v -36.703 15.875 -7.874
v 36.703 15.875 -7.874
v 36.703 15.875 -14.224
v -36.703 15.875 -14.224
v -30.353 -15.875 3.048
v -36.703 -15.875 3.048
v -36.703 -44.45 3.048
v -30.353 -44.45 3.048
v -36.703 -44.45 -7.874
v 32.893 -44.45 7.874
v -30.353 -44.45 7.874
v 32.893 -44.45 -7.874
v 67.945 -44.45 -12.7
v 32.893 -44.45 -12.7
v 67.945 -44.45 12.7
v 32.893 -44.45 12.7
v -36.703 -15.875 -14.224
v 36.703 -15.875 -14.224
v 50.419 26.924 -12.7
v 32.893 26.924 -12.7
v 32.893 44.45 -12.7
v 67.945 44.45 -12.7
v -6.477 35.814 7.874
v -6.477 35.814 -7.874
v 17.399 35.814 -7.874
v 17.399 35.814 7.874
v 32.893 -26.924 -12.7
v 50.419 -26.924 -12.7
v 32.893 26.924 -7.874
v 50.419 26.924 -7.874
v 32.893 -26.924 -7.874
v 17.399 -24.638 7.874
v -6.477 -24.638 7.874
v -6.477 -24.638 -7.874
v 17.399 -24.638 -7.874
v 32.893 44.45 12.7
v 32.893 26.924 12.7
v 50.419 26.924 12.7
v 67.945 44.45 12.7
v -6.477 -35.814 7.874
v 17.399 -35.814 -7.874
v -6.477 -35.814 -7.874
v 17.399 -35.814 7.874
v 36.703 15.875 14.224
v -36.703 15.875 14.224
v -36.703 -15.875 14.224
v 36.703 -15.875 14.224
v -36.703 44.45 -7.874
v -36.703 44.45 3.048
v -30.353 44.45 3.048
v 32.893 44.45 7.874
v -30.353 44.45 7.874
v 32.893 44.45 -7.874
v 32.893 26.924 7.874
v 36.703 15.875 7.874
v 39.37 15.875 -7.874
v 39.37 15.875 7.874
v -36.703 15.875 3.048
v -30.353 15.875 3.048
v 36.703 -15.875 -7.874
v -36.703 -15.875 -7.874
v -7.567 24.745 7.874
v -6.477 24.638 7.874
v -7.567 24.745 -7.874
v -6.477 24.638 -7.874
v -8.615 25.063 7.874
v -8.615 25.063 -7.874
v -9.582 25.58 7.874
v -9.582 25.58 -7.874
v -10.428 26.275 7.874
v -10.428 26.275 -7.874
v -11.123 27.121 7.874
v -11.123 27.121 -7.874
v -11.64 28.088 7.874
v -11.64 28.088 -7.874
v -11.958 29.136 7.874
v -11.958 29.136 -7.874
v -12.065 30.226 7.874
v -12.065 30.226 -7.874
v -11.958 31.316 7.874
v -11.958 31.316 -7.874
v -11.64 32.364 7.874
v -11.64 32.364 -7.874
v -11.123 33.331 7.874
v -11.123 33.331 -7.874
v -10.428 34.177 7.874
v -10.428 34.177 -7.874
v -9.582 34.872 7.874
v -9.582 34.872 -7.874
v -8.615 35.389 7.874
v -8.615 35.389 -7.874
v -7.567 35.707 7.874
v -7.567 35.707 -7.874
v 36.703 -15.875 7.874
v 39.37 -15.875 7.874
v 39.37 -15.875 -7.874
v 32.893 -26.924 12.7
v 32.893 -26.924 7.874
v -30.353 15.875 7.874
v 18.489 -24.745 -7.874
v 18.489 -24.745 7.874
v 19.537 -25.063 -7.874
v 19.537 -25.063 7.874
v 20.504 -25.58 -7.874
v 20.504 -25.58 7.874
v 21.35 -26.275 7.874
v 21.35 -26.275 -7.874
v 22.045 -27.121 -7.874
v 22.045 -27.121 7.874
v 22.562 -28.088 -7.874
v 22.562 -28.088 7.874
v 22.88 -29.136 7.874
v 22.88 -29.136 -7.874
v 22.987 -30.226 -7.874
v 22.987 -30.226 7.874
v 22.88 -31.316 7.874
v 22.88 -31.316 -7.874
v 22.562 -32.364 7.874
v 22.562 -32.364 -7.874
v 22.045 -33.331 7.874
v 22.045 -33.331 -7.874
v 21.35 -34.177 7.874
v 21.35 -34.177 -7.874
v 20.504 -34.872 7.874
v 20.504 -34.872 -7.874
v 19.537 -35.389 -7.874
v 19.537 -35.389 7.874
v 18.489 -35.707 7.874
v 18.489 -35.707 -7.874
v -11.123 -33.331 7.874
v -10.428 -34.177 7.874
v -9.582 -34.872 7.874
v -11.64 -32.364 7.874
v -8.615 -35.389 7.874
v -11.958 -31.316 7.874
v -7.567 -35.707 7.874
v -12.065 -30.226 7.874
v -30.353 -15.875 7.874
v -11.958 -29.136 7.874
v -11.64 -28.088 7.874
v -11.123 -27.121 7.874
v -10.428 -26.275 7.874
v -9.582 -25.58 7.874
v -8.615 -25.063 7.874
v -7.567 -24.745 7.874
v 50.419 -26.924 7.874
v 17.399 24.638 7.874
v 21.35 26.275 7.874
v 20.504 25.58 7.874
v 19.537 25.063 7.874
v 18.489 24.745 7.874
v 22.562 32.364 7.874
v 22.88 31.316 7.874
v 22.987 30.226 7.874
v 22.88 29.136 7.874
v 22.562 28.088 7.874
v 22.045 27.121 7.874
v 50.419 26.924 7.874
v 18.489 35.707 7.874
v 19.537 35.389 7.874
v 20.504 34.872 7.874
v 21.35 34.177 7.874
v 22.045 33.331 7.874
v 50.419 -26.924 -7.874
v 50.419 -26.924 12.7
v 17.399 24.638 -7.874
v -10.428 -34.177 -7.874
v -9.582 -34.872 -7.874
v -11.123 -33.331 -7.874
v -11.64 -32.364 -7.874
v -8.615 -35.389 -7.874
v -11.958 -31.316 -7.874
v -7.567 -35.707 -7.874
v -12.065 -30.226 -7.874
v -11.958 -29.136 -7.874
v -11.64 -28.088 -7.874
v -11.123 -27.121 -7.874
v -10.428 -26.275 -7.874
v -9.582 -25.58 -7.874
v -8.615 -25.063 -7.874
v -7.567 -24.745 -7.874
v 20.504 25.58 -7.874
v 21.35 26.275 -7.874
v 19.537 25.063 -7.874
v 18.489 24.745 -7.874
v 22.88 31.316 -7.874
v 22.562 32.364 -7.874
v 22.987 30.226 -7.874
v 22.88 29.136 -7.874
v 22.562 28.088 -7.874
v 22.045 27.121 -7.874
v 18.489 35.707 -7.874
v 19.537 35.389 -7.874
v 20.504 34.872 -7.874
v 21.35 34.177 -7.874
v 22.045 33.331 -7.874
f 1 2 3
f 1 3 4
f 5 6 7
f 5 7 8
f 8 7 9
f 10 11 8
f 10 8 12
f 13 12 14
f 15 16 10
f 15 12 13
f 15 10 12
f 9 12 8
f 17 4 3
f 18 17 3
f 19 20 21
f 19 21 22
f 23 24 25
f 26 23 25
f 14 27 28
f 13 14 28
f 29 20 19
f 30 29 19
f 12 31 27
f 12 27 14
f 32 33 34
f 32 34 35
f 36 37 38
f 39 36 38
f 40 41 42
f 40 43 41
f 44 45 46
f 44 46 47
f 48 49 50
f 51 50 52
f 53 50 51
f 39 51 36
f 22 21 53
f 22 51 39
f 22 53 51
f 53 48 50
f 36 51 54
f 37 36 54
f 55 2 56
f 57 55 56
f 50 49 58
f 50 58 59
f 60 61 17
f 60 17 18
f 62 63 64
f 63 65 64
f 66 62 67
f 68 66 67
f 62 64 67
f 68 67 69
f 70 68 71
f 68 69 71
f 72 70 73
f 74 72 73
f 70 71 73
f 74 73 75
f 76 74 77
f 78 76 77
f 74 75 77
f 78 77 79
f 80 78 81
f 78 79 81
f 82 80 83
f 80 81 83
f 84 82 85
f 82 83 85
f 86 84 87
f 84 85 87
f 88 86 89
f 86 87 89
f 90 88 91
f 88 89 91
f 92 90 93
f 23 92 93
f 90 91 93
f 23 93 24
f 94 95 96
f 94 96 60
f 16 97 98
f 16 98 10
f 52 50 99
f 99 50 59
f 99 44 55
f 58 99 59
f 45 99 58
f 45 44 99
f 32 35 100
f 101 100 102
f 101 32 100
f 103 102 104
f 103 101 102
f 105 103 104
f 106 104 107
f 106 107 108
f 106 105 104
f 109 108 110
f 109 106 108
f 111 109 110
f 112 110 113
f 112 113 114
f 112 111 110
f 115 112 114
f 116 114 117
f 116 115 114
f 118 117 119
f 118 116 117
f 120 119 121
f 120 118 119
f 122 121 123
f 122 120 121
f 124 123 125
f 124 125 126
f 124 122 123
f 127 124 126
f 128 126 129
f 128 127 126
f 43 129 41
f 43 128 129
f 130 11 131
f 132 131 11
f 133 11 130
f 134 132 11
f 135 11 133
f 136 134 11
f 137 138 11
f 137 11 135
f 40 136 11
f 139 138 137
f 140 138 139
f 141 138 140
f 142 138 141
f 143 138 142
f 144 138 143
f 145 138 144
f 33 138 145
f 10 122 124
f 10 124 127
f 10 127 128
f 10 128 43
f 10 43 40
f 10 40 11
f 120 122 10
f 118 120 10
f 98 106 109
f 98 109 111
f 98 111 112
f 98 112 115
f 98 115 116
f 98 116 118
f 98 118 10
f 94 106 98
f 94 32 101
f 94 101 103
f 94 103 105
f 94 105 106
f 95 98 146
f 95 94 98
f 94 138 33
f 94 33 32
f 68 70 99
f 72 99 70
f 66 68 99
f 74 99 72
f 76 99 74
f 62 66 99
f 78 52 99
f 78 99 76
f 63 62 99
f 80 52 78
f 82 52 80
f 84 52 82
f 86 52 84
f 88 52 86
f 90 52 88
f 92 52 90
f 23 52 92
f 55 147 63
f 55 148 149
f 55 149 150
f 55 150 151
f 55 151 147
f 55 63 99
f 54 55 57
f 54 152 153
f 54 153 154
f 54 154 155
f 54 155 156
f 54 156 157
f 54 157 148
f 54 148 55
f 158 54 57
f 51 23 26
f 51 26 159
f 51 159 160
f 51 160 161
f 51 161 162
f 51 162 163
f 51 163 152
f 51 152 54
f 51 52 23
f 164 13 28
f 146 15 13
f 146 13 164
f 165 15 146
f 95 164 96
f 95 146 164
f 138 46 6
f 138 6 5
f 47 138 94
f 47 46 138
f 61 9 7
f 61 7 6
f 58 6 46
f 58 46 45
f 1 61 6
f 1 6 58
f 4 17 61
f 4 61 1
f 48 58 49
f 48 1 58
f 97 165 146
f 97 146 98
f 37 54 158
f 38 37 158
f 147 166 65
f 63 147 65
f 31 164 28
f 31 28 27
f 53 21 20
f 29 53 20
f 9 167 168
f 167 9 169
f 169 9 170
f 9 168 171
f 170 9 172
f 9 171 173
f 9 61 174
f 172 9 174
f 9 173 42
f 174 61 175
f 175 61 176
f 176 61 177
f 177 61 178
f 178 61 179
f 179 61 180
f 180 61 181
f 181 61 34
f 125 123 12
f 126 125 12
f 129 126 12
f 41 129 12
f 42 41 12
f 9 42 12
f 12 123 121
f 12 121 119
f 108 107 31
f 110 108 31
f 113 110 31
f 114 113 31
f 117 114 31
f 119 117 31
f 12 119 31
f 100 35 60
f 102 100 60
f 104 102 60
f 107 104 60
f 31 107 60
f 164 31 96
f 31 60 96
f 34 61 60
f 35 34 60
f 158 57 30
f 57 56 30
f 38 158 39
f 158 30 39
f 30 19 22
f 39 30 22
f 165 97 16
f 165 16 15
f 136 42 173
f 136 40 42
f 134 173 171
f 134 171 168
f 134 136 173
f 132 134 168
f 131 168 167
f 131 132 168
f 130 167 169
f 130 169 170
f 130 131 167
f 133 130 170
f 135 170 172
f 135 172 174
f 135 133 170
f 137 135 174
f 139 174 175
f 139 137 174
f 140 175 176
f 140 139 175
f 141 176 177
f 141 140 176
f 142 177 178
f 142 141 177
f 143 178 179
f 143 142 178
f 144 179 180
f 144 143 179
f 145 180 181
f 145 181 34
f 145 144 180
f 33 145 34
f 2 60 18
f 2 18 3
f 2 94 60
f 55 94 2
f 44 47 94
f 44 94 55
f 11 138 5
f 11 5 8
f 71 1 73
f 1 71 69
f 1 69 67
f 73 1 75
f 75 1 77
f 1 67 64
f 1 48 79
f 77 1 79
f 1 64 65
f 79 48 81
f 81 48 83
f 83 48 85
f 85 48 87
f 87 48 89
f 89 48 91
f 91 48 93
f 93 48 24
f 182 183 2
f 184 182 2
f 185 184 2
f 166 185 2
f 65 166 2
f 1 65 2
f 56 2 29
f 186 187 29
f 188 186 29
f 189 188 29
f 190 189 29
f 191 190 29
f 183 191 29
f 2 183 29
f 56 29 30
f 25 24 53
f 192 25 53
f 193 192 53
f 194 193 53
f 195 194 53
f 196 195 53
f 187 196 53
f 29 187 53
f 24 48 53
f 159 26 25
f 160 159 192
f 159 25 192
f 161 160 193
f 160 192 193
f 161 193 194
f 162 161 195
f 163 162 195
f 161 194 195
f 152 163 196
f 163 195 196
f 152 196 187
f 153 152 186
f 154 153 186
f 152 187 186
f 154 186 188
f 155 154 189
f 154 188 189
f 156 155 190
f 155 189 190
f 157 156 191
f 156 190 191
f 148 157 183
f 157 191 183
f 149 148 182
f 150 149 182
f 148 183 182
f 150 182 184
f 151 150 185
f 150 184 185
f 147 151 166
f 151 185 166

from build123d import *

# Parameters (mm, degrees)
F1_DEPTH = 14.224
F2_DEPTH = 7.874
F3_DEPTH = 12.7
F0_W     = 6.35
F0_H     = 28.575
F4_DEPTH = 7.874
F5_DEPTH = 3.048


with BuildPart() as f1:
    # F0 (on Top) → F1 (new body, symmetric)
    with BuildSketch(Plane.XY):
        Polygon((-30.353, 15.875), (-36.703, 15.875), (-36.703, -15.875), (-30.353, -15.875), (36.703, -15.875), (36.703, 15.875), align=None)
    extrude(amount=F1_DEPTH, both=True)

    # F0 (on Top) → F2 (join, symmetric)
    with BuildSketch(Plane.XY):
        Polygon((-30.353, 44.45), (-30.353, 15.875), (36.703, 15.875), (39.37, 15.875), (50.419, 26.924), (32.893, 26.924), (32.893, 44.45), align=None)
        with BuildLine():
            ThreePointArc((-6.477, 24.638), (-12.065, 30.226), (-6.477, 35.814))
            Line((-6.477, 35.814), (17.399, 35.814))
            ThreePointArc((17.399, 35.814), (22.987, 30.226), (17.399, 24.638))
            Line((17.399, 24.638), (-6.477, 24.638))
        make_face(mode=Mode.SUBTRACT)
        Polygon((36.703, -15.875), (-30.353, -15.875), (-30.353, -44.45), (32.893, -44.45), (32.893, -26.924), (50.419, -26.924), (39.37, -15.875), align=None)
        with BuildLine():
            Line((-6.477, -24.638), (17.399, -24.638))
            ThreePointArc((17.399, -24.638), (22.987, -30.226), (17.399, -35.814))
            Line((17.399, -35.814), (-6.477, -35.814))
            ThreePointArc((-6.477, -35.814), (-12.065, -30.226), (-6.477, -24.638))
        make_face(mode=Mode.SUBTRACT)
    extrude(amount=F2_DEPTH, both=True)

    # F0 (on Top) → F3 (join, symmetric)
    with BuildSketch(Plane.XY):
        Polygon((67.945, 44.45), (32.893, 44.45), (32.893, 26.924), (50.419, 26.924), align=None)
        Polygon((32.893, -26.924), (32.893, -44.45), (67.945, -44.45), (50.419, -26.924), align=None)
    extrude(amount=F3_DEPTH, both=True)

    # F0 (on Top) → F4 (join)
    with BuildSketch(Plane.XY):
        with Locations((-33.528, 30.1625)):
            Rectangle(F0_W, F0_H)
        with Locations((-33.528, -30.1625)):
            Rectangle(F0_W, F0_H)
    extrude(amount=-F4_DEPTH)

    # F0 (on Top) → F5 (join)
    with BuildSketch(Plane.XY):
        with Locations((-33.528, 30.1625)):
            Rectangle(F0_W, F0_H)
        with Locations((-33.528, -30.1625)):
            Rectangle(F0_W, F0_H)
    extrude(amount=F5_DEPTH)


solid = f1.part
